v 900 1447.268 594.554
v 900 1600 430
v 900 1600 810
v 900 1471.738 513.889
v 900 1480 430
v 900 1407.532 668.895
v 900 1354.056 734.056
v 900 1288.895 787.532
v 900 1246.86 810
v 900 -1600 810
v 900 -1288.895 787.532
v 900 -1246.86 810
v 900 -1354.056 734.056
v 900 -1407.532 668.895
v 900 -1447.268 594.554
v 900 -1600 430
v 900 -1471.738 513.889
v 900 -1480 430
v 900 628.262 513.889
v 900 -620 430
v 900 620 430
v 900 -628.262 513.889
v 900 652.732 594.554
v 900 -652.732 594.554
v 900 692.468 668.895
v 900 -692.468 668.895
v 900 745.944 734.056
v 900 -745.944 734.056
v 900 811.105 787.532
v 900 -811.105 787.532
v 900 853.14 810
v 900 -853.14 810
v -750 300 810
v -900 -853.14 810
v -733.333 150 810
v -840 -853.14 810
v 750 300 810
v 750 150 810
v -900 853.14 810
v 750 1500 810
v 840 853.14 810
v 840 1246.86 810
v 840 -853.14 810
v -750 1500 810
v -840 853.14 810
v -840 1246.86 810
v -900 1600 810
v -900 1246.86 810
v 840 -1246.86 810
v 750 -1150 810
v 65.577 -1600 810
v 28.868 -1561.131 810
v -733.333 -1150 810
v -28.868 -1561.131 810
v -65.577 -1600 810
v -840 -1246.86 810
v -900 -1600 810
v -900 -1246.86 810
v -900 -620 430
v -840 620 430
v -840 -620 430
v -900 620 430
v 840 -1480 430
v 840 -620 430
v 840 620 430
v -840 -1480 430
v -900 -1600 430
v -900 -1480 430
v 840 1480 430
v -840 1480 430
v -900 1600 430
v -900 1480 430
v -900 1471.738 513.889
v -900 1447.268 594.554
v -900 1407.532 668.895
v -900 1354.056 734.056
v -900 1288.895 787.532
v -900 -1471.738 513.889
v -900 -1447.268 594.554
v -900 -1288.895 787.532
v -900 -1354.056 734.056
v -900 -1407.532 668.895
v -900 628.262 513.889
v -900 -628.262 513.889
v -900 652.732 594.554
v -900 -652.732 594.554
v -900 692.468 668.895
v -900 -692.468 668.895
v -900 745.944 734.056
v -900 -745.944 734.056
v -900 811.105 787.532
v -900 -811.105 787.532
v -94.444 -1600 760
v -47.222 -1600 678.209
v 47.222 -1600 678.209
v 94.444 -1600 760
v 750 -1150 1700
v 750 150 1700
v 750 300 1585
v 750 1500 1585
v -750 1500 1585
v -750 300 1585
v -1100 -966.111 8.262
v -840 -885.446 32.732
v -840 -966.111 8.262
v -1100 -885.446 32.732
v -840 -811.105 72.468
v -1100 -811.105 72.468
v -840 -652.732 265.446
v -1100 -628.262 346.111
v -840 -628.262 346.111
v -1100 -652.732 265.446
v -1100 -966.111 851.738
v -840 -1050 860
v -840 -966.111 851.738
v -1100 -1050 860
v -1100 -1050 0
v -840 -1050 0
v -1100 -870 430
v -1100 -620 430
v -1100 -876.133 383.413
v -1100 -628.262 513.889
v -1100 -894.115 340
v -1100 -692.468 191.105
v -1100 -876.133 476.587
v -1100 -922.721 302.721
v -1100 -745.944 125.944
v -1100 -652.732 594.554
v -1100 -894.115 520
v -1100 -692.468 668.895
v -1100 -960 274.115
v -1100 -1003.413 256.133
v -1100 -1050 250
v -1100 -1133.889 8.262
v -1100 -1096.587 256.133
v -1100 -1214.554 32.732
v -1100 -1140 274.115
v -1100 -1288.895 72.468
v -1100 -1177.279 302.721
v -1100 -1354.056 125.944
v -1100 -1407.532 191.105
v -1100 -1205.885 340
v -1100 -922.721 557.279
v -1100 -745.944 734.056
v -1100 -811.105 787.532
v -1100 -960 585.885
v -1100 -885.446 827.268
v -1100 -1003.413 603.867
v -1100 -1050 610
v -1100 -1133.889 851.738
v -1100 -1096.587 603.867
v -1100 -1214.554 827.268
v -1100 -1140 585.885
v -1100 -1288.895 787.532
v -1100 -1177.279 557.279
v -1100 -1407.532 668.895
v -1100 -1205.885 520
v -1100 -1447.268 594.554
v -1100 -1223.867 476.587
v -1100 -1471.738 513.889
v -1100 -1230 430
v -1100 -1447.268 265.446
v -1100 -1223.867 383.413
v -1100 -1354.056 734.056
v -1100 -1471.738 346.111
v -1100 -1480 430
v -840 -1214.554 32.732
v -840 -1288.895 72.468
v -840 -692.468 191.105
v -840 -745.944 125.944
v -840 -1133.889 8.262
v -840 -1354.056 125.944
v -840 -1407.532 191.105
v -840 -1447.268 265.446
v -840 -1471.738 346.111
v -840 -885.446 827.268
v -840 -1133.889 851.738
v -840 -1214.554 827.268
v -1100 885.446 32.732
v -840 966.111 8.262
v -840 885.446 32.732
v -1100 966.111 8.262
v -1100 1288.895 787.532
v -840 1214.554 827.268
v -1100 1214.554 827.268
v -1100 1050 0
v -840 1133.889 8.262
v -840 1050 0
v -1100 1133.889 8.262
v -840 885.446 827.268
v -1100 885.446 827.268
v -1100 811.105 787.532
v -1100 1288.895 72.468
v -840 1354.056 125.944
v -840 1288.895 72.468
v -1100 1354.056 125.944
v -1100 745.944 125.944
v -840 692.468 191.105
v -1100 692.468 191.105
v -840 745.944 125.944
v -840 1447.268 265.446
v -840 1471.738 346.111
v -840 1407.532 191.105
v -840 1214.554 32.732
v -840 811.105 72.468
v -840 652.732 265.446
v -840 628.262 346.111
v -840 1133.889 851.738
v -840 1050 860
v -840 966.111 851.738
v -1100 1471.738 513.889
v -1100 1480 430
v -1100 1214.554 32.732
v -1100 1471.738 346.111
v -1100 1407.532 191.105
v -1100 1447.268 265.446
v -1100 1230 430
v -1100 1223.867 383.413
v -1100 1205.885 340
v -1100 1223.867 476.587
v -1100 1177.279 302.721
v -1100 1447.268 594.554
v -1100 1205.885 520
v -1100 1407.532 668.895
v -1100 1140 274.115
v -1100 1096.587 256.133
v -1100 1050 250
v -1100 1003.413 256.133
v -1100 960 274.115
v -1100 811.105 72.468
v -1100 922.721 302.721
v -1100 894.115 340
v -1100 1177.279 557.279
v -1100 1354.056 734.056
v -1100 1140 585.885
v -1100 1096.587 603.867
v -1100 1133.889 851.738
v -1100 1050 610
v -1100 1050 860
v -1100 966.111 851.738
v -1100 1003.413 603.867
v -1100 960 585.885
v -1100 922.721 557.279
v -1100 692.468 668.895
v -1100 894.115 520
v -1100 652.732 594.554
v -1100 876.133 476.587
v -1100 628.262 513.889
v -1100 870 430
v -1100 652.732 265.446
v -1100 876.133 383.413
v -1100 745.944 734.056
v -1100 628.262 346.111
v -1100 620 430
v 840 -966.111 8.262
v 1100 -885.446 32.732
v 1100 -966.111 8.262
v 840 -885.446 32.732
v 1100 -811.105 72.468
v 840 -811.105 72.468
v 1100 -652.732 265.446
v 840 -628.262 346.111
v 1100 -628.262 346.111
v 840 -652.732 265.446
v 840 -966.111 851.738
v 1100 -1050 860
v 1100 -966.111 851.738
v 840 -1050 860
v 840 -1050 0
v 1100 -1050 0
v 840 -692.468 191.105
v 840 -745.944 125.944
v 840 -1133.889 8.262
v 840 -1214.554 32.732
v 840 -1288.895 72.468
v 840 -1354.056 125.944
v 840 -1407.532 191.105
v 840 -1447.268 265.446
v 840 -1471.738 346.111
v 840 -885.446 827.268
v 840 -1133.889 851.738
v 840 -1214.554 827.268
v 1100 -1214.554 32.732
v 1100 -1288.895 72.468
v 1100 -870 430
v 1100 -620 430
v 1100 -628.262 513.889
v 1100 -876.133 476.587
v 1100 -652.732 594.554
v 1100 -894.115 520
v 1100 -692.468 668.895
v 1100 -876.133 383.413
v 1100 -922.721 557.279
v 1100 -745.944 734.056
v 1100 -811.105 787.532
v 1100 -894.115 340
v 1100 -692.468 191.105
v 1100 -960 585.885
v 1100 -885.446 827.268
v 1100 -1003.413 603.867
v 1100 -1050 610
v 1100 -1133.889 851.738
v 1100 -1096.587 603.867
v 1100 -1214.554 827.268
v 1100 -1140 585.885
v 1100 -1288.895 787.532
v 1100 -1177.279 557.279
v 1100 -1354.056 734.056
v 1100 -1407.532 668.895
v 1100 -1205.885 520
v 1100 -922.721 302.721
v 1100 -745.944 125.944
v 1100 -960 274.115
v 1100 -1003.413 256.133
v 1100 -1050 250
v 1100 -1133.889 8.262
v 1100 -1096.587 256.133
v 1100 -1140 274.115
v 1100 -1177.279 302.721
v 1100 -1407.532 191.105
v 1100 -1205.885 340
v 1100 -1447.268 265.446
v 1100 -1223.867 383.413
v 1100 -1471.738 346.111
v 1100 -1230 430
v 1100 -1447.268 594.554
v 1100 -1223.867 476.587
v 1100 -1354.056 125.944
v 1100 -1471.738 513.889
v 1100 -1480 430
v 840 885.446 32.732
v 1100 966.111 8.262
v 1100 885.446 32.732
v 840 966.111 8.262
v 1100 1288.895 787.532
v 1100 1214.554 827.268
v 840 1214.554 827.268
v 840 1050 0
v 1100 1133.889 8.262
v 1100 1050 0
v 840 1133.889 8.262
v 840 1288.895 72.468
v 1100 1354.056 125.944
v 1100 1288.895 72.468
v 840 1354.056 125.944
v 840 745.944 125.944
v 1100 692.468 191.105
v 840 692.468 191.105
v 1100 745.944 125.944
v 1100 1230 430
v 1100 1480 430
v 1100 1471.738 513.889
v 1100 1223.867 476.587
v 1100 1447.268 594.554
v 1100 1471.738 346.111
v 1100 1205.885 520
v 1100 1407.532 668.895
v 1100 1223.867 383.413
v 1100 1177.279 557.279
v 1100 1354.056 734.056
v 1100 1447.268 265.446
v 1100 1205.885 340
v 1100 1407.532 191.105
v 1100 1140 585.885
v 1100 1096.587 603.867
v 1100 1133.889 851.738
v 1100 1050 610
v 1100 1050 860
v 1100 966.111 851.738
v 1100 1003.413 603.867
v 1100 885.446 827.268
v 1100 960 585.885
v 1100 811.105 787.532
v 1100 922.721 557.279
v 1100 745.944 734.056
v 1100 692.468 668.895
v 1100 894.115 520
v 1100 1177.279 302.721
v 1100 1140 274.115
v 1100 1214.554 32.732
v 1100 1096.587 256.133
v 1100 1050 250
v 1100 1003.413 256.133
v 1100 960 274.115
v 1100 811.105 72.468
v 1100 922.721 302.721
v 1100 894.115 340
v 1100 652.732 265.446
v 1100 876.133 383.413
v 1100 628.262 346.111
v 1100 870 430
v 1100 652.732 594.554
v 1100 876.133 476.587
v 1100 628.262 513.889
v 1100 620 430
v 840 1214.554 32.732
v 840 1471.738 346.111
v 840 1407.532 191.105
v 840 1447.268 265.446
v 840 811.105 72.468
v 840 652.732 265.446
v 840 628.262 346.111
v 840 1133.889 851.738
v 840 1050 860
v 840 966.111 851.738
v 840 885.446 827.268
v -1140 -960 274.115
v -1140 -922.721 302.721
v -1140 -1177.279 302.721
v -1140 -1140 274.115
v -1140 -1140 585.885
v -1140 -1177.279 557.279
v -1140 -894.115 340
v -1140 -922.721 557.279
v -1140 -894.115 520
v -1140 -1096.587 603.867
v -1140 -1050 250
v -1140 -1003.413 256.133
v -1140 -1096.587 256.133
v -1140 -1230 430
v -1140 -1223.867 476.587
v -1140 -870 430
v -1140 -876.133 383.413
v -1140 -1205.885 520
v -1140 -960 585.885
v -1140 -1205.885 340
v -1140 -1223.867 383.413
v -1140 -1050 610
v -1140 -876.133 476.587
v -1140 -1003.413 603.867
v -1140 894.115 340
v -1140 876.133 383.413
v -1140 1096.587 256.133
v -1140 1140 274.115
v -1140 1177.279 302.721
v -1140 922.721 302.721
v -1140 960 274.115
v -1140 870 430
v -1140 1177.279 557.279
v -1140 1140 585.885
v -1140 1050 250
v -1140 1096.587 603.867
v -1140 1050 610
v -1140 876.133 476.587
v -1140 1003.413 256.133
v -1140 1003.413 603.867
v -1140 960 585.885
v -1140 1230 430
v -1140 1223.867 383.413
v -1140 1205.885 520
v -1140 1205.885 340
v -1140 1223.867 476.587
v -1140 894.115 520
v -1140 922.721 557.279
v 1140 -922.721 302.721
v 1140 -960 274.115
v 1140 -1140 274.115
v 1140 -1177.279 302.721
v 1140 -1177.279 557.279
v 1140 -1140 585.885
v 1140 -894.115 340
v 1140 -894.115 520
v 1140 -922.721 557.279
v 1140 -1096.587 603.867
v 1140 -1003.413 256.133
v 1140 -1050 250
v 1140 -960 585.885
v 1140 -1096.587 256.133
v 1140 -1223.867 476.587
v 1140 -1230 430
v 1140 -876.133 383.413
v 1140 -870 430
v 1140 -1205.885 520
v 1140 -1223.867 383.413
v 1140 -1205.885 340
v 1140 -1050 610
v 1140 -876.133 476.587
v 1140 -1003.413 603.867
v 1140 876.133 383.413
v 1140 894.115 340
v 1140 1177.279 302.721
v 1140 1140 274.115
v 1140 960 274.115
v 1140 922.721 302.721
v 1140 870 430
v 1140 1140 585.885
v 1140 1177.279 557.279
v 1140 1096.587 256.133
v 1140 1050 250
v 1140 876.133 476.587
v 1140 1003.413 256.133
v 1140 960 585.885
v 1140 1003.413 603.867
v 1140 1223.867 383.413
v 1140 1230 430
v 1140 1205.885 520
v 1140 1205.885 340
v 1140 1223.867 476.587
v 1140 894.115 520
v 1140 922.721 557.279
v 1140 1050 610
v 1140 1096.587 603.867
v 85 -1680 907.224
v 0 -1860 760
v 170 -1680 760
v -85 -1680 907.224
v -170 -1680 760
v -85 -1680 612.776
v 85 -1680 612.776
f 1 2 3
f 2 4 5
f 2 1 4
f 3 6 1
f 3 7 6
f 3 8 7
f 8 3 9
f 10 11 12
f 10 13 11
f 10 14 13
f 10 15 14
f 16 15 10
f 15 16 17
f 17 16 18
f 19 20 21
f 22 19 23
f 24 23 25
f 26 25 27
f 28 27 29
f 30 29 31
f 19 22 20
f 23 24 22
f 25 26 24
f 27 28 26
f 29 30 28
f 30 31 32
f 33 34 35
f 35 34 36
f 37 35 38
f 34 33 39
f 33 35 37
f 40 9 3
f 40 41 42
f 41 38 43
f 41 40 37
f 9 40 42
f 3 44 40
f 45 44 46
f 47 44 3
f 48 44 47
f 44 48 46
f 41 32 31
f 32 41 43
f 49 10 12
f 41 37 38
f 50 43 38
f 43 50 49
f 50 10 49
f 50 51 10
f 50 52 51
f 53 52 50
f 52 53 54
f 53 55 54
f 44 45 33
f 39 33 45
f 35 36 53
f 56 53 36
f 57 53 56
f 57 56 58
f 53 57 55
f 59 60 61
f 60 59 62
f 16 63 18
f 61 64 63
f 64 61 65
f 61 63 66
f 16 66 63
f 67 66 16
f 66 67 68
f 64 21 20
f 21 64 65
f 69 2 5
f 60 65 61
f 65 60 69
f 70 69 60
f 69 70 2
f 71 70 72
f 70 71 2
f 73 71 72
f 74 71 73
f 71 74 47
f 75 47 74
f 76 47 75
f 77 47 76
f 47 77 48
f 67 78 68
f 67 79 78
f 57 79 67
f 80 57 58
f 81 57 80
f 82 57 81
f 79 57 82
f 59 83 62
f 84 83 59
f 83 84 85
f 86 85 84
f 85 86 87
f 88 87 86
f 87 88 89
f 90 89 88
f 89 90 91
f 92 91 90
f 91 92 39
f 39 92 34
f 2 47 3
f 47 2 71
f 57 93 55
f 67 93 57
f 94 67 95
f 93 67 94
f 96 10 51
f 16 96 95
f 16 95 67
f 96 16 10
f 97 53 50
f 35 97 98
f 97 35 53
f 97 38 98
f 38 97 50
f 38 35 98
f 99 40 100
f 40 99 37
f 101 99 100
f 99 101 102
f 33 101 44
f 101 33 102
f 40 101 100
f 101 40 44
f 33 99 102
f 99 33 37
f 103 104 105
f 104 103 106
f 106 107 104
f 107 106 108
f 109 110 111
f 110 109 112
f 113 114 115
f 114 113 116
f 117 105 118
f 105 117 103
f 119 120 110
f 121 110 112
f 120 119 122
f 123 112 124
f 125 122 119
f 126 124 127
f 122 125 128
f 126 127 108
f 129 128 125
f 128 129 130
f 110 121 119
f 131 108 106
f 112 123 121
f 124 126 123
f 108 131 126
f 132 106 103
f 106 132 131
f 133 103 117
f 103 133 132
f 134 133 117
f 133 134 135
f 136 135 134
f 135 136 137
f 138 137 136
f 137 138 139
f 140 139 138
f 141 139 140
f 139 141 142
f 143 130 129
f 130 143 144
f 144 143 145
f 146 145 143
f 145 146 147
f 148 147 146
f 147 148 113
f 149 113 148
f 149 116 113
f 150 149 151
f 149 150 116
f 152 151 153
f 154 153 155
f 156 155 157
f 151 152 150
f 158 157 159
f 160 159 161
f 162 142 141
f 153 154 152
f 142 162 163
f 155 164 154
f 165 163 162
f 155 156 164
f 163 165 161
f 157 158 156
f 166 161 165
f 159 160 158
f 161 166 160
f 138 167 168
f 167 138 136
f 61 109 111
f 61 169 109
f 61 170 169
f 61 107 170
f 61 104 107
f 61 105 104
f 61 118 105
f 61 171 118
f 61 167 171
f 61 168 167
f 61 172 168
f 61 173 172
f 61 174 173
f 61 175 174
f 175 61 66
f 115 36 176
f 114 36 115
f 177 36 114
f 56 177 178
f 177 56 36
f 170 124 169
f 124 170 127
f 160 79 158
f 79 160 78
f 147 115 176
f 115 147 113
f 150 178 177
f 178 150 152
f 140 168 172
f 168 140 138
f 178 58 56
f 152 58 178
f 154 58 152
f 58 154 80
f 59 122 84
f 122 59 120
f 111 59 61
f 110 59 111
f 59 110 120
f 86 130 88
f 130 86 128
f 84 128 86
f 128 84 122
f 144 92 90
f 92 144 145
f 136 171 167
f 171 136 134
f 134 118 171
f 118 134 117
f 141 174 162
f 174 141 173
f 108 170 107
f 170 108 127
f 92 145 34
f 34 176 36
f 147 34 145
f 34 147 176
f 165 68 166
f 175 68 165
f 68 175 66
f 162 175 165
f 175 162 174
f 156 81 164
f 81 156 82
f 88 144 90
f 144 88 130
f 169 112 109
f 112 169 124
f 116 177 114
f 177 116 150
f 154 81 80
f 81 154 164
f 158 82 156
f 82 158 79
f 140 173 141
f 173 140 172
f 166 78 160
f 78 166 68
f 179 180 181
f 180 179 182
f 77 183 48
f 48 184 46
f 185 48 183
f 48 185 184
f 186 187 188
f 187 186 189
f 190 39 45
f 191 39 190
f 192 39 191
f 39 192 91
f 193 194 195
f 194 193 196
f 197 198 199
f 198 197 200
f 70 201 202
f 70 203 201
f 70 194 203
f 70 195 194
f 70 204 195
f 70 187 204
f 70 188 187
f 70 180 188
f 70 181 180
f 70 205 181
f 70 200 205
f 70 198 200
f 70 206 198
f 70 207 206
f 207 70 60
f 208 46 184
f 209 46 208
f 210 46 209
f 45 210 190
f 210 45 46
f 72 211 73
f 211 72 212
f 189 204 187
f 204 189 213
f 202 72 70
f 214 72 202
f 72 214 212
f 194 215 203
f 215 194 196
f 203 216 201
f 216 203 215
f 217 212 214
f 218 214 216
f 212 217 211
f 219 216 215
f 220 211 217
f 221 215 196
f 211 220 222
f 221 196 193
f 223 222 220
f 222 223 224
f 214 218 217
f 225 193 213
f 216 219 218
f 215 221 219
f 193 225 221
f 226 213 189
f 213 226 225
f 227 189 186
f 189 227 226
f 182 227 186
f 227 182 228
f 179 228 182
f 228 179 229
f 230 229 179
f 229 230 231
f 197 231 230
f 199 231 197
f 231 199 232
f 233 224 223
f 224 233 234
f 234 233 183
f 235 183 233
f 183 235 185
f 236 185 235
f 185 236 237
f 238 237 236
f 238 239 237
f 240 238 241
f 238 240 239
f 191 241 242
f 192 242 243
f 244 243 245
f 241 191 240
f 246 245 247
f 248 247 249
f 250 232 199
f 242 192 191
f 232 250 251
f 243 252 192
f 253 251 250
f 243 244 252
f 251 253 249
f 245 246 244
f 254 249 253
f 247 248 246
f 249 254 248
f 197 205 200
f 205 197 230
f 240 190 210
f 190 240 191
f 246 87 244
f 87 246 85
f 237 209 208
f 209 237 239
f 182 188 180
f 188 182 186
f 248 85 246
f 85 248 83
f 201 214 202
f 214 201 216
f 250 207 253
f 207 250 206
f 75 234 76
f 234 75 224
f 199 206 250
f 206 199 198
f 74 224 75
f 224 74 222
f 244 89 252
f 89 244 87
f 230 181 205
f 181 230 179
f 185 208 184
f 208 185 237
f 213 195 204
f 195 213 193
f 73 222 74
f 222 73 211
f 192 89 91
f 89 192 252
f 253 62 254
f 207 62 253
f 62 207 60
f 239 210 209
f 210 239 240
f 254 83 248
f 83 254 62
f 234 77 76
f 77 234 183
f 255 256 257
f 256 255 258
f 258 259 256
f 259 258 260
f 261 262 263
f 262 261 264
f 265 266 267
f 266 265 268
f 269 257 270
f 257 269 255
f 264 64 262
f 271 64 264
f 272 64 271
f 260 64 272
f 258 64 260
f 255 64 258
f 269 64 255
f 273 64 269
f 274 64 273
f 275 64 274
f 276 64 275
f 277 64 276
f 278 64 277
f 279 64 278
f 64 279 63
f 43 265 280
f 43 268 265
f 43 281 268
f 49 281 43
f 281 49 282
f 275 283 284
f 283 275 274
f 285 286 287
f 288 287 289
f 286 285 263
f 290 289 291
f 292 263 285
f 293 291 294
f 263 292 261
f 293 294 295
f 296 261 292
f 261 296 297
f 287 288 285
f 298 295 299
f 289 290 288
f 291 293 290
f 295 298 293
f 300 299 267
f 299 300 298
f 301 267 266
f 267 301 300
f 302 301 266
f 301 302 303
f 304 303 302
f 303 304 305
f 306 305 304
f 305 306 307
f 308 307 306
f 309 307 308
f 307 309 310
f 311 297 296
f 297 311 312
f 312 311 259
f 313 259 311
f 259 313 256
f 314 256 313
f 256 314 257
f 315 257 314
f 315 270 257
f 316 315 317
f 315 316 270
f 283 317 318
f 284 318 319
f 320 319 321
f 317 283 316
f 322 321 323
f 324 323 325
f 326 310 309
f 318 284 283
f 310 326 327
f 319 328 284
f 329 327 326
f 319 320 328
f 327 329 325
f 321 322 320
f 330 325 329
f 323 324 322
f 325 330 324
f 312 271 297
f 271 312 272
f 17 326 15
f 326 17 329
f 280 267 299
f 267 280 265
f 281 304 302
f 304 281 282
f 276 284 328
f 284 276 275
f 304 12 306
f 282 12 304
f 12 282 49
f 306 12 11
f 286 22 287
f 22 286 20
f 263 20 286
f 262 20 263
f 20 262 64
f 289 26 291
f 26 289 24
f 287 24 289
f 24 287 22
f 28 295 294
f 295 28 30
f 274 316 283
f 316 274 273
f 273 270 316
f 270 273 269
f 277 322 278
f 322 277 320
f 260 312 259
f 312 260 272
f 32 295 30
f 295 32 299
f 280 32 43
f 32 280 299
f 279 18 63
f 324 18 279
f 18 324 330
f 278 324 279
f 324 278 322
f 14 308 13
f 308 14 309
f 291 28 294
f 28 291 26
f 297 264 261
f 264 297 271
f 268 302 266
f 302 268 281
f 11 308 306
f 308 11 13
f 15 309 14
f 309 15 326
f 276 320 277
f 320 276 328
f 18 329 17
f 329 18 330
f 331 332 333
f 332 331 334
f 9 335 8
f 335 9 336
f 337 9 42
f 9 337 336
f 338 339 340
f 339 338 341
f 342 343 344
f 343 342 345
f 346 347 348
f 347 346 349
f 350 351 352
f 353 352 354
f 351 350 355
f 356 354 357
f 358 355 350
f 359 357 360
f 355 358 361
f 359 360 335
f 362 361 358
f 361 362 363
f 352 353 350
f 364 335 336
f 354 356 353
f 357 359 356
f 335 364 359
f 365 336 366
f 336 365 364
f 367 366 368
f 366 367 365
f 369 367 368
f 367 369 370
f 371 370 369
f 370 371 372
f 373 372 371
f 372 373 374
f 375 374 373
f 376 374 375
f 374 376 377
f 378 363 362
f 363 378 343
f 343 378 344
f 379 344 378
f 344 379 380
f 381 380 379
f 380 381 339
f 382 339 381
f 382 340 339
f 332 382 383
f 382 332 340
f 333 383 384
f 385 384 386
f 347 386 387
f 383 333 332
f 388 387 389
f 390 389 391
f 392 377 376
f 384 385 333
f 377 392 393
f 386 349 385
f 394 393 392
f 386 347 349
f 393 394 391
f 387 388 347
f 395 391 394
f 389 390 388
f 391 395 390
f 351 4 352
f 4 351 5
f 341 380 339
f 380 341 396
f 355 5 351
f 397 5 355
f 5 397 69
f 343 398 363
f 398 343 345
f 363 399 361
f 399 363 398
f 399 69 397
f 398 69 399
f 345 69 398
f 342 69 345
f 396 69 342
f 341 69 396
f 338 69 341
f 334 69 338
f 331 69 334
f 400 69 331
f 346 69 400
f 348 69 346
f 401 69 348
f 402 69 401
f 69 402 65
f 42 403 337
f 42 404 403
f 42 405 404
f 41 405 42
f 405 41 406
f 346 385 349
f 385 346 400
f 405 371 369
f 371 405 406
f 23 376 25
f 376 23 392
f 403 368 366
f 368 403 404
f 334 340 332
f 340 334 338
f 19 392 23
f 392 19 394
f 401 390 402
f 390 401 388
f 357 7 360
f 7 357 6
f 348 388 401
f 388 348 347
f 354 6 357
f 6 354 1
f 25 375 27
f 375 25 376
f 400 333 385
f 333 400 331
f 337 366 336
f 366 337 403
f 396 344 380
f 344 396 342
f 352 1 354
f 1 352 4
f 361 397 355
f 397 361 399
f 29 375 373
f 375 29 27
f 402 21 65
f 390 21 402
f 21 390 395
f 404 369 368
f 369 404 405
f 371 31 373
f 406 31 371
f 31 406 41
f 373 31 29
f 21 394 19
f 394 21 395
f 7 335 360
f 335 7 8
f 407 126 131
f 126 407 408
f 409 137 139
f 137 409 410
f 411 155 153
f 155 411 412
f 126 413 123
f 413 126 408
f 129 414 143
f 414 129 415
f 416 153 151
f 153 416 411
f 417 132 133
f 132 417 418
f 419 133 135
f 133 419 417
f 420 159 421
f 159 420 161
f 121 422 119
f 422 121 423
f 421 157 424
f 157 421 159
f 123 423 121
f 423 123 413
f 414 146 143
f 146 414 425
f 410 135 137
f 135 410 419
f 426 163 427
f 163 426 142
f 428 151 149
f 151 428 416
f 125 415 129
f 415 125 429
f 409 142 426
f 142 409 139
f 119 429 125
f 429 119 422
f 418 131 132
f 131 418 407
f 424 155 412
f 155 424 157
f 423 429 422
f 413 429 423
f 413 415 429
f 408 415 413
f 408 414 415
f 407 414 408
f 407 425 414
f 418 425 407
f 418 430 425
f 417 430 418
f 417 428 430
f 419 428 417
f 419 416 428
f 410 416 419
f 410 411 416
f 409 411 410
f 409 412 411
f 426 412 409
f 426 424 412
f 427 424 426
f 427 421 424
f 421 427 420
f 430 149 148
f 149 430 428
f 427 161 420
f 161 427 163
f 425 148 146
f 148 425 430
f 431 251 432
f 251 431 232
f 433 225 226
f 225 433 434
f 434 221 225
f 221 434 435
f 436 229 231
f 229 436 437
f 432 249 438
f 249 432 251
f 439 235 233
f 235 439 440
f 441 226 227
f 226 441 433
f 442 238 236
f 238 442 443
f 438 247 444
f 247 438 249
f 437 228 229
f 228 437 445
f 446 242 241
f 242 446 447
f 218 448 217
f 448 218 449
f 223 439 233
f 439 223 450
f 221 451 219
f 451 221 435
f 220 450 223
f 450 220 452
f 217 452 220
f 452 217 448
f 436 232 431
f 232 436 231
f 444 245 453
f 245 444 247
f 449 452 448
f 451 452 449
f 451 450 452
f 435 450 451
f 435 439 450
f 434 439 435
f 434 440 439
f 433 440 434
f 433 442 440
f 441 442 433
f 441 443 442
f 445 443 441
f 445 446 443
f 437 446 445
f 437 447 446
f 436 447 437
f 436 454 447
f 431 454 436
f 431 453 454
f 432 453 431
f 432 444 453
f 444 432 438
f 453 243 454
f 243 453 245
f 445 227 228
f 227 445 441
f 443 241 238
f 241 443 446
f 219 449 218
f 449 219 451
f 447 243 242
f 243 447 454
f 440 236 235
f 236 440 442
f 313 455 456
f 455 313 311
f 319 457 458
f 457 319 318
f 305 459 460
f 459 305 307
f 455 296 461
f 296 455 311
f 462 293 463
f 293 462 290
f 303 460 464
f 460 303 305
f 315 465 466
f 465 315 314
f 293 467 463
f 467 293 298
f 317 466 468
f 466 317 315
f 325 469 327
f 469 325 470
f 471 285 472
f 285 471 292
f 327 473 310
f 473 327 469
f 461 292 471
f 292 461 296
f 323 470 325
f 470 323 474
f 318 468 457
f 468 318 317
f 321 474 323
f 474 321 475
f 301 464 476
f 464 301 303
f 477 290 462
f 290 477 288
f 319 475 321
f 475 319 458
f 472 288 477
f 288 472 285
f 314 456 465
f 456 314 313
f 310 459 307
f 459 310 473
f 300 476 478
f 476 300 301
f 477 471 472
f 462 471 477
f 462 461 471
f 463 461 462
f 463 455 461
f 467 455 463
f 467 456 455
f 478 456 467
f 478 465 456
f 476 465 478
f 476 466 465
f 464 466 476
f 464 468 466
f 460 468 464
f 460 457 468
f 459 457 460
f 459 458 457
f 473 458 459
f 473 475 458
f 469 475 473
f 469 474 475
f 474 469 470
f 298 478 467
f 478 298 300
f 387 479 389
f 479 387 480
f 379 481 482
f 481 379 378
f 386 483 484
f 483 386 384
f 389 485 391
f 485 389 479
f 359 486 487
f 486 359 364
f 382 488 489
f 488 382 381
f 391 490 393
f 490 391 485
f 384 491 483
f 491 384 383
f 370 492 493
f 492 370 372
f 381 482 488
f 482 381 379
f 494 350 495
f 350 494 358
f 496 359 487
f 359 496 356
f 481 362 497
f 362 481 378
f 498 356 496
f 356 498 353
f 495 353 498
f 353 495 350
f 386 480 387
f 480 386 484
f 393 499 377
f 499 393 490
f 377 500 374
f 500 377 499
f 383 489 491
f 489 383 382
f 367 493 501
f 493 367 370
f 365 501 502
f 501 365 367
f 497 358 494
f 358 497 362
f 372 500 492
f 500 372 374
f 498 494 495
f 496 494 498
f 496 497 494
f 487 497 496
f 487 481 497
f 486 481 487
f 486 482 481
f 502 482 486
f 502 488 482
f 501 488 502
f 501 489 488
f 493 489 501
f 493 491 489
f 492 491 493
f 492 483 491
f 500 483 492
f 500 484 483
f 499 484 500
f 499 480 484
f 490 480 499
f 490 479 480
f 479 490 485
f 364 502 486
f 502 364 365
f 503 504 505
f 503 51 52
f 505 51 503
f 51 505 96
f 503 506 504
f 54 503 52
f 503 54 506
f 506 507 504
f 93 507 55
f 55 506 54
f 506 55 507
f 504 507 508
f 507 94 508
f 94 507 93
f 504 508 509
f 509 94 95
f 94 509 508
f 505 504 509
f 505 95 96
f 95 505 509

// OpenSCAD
// Generated by AXM Machine Geometry Foundry 0.4.0
// Asset: AXM-VEHICLE-CHASSIS-001 AXM Modular Utility Vehicle Chassis v0.4.0
// Units: millimetres; source orientation: +Z up, -Y forward.
// Canonical source is recipe.json. This is an editable generated bridge.

// instance: chassis | base: chassis | print_group: chassis
color([0.09412, 0.11373, 0.15294, 1.00000])
translate([0, 0, 620]) rotate([0, 0, 0]) scale([1, 1, 1]) cube([1800, 3200, 380], center=true);

// instance: cabin | base: cabin | print_group: cabin
color([0.17647, 0.22745, 0.29804, 1.00000])
translate([0, -500, 1250]) rotate([0, 0, 0]) scale([1, 1, 1]) polyhedron(points=[[-750.0, -650.0, -450.0], [750.0, -650.0, -450.0], [750.0, -650.0, 450.0], [-750.0, 650.0, -450.0], [750.0, 650.0, -450.0], [750.0, 650.0, 450.0]], faces=[[0, 2, 1], [3, 4, 5], [0, 1, 4, 3], [1, 2, 5, 4], [2, 0, 3, 5]], convexity=10);

// instance: cargo | base: cargo | print_group: cargo
color([0.17647, 0.22745, 0.29804, 1.00000])
translate([0, 900, 1160]) rotate([0, 0, 0]) scale([1, 1, 1]) cube([1500, 1200, 850], center=true);

// instance: wheel__g00 | base: wheel | print_group: wheel
color([0.17647, 0.22745, 0.29804, 1.00000])
translate([-970, -1050, 430]) rotate([0, 90, 0]) scale([1, 1, 1]) cylinder(h=260, r=430, center=true, $fn=32);

// instance: wheel__g01 | base: wheel | print_group: wheel
color([0.17647, 0.22745, 0.29804, 1.00000])
translate([-970, 1050, 430]) rotate([0, 90, 0]) scale([1, 1, 1]) cylinder(h=260, r=430, center=true, $fn=32);

// instance: wheel__g02 | base: wheel | print_group: wheel
color([0.17647, 0.22745, 0.29804, 1.00000])
translate([970, -1050, 430]) rotate([0, 90, 0]) scale([1, 1, 1]) cylinder(h=260, r=430, center=true, $fn=32);

// instance: wheel__g03 | base: wheel | print_group: wheel
color([0.17647, 0.22745, 0.29804, 1.00000])
translate([970, 1050, 430]) rotate([0, 90, 0]) scale([1, 1, 1]) cylinder(h=260, r=430, center=true, $fn=32);

// instance: hub__g00 | base: hub | print_group: hub
color([0.13725, 0.80392, 0.92157, 1.00000])
translate([-990, -1050, 430]) rotate([0, 90, 0]) scale([1, 1, 1]) cylinder(h=300, r=180, center=true, $fn=24);

// instance: hub__g01 | base: hub | print_group: hub
color([0.13725, 0.80392, 0.92157, 1.00000])
translate([-990, 1050, 430]) rotate([0, 90, 0]) scale([1, 1, 1]) cylinder(h=300, r=180, center=true, $fn=24);

// instance: hub__g02 | base: hub | print_group: hub
color([0.13725, 0.80392, 0.92157, 1.00000])
translate([990, -1050, 430]) rotate([0, 90, 0]) scale([1, 1, 1]) cylinder(h=300, r=180, center=true, $fn=24);

// instance: hub__g03 | base: hub | print_group: hub
color([0.13725, 0.80392, 0.92157, 1.00000])
translate([990, 1050, 430]) rotate([0, 90, 0]) scale([1, 1, 1]) cylinder(h=300, r=180, center=true, $fn=24);

// instance: front_core | base: front_core | print_group: front_core
color([0.66275, 0.32157, 1.00000, 0.92157])
translate([0, -1680, 760]) rotate([90, 0, 0]) scale([1, 1, 1]) polyhedron(points=[[170.0, 0.0, 0.0], [85.0, 147.22431864, 0.0], [-85.0, 147.22431864, 0.0], [-170.0, 0.0, 0.0], [-85.0, -147.22431864, 0.0], [85.0, -147.22431864, 0.0], [0.0, 0.0, 180.0], [0.0, 0.0, -180.0]], faces=[[6, 0, 1], [7, 1, 0], [6, 1, 2], [7, 2, 1], [6, 2, 3], [7, 3, 2], [6, 3, 4], [7, 4, 3], [6, 4, 5], [7, 5, 4], [6, 5, 0], [7, 0, 5]], convexity=10);
